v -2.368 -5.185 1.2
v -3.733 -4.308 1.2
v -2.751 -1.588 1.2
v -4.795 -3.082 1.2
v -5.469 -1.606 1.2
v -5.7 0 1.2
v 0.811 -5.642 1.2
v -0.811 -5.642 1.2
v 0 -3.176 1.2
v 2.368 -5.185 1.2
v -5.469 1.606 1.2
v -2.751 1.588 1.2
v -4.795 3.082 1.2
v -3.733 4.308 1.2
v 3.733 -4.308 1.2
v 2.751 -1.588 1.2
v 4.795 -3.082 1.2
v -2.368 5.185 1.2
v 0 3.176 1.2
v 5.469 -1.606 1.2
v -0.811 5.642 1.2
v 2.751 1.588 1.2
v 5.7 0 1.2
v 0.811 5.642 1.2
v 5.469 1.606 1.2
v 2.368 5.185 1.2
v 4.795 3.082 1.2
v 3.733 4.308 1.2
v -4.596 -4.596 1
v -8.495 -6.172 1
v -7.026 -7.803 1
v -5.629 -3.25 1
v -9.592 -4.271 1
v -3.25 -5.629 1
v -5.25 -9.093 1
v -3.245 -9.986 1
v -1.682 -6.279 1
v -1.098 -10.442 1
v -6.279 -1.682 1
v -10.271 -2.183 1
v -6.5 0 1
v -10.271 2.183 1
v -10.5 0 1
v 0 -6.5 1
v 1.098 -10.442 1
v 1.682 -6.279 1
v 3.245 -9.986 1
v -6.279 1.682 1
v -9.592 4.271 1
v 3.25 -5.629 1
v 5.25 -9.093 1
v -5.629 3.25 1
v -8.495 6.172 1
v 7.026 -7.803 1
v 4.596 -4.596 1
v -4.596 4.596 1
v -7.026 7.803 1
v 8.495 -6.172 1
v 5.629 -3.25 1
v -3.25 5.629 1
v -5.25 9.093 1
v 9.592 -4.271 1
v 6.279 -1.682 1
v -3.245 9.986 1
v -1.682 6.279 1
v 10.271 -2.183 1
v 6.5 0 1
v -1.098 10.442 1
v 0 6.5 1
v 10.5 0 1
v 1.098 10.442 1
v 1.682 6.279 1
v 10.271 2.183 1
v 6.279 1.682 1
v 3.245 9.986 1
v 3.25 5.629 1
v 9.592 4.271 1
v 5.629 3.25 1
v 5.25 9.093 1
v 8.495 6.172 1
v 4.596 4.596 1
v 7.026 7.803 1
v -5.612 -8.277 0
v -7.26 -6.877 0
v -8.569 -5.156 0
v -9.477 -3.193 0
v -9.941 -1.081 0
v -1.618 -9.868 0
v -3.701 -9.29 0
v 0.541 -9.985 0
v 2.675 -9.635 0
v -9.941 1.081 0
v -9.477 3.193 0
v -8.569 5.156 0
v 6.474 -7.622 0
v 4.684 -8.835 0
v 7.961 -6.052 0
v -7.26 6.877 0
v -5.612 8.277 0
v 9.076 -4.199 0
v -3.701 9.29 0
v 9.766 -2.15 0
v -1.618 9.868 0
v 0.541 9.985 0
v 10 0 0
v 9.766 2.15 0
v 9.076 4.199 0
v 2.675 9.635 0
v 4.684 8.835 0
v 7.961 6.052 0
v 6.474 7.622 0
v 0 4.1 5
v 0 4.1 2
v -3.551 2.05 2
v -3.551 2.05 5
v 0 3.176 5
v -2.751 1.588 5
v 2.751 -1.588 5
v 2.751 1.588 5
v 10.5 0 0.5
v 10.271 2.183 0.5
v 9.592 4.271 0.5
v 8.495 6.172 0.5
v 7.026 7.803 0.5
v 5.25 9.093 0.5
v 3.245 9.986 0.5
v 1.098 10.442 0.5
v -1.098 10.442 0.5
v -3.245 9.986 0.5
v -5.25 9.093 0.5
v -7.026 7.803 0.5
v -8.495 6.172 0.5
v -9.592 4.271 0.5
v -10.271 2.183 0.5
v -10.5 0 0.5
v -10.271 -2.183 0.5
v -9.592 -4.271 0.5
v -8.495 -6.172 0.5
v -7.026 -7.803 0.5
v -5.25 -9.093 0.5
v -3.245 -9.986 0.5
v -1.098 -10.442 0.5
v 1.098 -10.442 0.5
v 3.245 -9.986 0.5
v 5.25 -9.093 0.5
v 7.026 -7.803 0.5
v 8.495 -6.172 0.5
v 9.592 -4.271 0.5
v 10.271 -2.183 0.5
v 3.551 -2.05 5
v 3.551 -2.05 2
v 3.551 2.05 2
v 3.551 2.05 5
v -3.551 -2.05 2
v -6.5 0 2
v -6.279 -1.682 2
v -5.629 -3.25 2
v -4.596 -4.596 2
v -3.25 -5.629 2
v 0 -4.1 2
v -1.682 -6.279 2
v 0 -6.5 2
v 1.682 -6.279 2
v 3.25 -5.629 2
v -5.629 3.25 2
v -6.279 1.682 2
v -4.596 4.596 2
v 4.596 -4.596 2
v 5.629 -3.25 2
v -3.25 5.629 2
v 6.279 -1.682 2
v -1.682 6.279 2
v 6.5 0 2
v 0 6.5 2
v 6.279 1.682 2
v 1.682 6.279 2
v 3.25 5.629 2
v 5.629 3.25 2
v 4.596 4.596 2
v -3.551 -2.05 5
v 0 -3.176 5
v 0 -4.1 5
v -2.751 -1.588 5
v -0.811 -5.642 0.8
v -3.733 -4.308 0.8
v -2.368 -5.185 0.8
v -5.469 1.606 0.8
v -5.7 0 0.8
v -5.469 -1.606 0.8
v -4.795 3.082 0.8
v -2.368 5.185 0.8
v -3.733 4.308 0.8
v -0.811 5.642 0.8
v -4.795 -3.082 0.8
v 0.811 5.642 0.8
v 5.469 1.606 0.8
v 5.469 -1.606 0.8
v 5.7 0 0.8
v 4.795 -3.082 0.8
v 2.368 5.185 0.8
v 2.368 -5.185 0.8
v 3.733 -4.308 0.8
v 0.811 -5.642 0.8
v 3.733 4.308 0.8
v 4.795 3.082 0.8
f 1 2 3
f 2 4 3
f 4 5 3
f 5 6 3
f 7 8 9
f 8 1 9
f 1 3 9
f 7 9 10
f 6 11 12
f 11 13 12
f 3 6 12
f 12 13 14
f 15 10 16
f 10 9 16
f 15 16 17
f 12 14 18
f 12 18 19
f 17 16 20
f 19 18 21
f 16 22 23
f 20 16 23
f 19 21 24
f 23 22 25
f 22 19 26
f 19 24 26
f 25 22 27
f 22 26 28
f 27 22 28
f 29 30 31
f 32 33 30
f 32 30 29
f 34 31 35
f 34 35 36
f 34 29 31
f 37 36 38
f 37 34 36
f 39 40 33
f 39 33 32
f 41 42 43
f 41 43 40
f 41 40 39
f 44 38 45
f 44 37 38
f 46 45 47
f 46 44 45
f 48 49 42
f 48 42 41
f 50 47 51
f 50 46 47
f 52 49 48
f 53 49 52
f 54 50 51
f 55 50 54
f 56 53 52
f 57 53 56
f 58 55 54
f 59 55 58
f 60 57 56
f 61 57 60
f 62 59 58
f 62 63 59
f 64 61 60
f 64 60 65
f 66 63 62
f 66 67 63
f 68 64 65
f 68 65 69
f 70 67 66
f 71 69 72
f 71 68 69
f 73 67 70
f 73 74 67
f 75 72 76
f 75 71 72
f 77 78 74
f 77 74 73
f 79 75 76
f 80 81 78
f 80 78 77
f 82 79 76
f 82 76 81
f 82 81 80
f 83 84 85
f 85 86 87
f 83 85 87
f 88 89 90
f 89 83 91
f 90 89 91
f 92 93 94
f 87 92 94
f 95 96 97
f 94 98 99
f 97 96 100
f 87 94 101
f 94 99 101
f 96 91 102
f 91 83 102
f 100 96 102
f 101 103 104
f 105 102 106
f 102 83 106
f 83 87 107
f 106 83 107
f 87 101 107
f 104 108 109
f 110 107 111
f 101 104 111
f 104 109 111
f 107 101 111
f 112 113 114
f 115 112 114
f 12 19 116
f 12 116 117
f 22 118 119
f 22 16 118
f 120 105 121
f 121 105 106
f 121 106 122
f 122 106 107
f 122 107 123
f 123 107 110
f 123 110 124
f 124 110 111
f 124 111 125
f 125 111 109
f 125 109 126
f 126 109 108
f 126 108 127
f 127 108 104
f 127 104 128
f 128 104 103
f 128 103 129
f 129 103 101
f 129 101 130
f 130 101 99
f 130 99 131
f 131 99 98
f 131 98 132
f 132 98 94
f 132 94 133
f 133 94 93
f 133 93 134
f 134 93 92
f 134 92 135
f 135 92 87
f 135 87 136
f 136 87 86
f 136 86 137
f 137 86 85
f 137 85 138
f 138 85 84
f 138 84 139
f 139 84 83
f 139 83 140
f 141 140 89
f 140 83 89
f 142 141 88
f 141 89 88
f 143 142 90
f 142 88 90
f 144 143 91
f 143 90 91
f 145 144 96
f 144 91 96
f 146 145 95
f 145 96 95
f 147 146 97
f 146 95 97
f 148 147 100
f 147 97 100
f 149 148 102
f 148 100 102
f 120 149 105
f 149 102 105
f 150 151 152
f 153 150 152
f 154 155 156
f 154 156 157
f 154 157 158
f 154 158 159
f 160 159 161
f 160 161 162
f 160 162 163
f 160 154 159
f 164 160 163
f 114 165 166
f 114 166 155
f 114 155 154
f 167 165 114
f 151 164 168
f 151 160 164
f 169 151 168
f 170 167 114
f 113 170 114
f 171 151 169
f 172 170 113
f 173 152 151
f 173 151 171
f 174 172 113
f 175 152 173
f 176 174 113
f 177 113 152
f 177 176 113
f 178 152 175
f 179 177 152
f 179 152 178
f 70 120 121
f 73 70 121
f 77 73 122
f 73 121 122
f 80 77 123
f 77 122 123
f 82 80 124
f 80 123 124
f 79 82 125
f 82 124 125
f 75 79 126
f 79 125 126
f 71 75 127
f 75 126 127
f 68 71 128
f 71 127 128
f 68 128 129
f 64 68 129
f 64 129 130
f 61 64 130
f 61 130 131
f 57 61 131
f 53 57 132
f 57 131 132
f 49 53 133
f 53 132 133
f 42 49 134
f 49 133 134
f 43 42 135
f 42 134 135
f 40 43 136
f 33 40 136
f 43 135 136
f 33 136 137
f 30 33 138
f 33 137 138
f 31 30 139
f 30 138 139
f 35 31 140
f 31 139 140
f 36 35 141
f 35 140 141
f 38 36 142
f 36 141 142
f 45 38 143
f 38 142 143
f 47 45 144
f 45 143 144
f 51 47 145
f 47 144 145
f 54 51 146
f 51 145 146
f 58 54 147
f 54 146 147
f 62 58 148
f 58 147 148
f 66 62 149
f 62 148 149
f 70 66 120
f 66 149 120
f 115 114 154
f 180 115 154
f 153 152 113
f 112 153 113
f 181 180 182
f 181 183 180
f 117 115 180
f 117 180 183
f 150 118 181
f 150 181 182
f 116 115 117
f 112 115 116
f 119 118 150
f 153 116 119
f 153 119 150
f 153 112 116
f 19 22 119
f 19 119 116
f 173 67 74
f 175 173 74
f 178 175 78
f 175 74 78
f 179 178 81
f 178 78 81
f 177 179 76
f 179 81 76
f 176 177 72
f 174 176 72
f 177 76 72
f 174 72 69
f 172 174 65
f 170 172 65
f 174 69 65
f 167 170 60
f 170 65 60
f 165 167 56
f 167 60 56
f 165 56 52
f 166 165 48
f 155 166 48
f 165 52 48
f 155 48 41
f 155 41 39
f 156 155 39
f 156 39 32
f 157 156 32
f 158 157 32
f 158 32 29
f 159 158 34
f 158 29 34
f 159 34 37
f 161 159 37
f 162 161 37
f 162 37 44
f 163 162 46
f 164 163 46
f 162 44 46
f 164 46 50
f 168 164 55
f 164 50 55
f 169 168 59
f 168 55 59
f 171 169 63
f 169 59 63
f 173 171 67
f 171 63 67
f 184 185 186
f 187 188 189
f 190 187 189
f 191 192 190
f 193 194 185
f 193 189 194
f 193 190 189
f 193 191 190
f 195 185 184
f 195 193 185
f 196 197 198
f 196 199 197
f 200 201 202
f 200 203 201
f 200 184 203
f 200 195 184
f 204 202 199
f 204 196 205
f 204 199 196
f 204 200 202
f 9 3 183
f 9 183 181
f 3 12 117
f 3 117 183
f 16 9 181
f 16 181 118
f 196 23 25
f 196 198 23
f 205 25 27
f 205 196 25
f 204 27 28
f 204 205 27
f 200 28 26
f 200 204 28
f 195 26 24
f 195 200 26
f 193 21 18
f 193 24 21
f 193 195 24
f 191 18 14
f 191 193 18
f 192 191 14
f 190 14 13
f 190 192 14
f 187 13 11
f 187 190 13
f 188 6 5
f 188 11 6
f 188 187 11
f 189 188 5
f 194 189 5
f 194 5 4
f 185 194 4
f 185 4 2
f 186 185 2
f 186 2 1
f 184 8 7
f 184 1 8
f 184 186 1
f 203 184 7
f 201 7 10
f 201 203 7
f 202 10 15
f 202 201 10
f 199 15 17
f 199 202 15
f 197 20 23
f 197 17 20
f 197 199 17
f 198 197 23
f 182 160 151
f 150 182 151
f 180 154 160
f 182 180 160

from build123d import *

# Parameters (mm, degrees)
F0_R     = 10.5
F1_DEPTH = 1
F2_R     = 6.5
F3_DEPTH = 1
F5_DEPTH = 3
F6_T     = -0.8
F7_SIZE  = 0.5


with BuildPart() as f1:
    # F0 (on Top) → F1 (new body)
    with BuildSketch(Plane.XY):
        Circle(F0_R)
    extrude(amount=F1_DEPTH)

    # F2 (on face) → F3 (join)
    with BuildSketch(Plane.XY.offset(1)):
        Circle(F2_R)
    extrude(amount=F3_DEPTH)

    # F4 (on face) → F5 (join)
    with BuildSketch(Plane.XY.offset(2)):
        Polygon((3.5507041555, 2.05), (0, 4.1), (-3.5507041555, 2.05), (-3.5507041555, -2.05), (0, -4.1), (3.5507041555, -2.05), align=None)
    extrude(amount=F5_DEPTH)

    # F6
    f6_openings = [f1.faces().sort_by_distance(p)[0] for p in [
        (0, 0, 5),
    ]]
    offset(amount=F6_T, openings=f6_openings, kind=Kind.INTERSECTION)

    # F7
    f7_edges = [f1.edges().sort_by_distance(p)[0] for p in [
        (-10.5, 0, 0),
    ]]
    chamfer(f7_edges, length=F7_SIZE)


solid = f1.part
